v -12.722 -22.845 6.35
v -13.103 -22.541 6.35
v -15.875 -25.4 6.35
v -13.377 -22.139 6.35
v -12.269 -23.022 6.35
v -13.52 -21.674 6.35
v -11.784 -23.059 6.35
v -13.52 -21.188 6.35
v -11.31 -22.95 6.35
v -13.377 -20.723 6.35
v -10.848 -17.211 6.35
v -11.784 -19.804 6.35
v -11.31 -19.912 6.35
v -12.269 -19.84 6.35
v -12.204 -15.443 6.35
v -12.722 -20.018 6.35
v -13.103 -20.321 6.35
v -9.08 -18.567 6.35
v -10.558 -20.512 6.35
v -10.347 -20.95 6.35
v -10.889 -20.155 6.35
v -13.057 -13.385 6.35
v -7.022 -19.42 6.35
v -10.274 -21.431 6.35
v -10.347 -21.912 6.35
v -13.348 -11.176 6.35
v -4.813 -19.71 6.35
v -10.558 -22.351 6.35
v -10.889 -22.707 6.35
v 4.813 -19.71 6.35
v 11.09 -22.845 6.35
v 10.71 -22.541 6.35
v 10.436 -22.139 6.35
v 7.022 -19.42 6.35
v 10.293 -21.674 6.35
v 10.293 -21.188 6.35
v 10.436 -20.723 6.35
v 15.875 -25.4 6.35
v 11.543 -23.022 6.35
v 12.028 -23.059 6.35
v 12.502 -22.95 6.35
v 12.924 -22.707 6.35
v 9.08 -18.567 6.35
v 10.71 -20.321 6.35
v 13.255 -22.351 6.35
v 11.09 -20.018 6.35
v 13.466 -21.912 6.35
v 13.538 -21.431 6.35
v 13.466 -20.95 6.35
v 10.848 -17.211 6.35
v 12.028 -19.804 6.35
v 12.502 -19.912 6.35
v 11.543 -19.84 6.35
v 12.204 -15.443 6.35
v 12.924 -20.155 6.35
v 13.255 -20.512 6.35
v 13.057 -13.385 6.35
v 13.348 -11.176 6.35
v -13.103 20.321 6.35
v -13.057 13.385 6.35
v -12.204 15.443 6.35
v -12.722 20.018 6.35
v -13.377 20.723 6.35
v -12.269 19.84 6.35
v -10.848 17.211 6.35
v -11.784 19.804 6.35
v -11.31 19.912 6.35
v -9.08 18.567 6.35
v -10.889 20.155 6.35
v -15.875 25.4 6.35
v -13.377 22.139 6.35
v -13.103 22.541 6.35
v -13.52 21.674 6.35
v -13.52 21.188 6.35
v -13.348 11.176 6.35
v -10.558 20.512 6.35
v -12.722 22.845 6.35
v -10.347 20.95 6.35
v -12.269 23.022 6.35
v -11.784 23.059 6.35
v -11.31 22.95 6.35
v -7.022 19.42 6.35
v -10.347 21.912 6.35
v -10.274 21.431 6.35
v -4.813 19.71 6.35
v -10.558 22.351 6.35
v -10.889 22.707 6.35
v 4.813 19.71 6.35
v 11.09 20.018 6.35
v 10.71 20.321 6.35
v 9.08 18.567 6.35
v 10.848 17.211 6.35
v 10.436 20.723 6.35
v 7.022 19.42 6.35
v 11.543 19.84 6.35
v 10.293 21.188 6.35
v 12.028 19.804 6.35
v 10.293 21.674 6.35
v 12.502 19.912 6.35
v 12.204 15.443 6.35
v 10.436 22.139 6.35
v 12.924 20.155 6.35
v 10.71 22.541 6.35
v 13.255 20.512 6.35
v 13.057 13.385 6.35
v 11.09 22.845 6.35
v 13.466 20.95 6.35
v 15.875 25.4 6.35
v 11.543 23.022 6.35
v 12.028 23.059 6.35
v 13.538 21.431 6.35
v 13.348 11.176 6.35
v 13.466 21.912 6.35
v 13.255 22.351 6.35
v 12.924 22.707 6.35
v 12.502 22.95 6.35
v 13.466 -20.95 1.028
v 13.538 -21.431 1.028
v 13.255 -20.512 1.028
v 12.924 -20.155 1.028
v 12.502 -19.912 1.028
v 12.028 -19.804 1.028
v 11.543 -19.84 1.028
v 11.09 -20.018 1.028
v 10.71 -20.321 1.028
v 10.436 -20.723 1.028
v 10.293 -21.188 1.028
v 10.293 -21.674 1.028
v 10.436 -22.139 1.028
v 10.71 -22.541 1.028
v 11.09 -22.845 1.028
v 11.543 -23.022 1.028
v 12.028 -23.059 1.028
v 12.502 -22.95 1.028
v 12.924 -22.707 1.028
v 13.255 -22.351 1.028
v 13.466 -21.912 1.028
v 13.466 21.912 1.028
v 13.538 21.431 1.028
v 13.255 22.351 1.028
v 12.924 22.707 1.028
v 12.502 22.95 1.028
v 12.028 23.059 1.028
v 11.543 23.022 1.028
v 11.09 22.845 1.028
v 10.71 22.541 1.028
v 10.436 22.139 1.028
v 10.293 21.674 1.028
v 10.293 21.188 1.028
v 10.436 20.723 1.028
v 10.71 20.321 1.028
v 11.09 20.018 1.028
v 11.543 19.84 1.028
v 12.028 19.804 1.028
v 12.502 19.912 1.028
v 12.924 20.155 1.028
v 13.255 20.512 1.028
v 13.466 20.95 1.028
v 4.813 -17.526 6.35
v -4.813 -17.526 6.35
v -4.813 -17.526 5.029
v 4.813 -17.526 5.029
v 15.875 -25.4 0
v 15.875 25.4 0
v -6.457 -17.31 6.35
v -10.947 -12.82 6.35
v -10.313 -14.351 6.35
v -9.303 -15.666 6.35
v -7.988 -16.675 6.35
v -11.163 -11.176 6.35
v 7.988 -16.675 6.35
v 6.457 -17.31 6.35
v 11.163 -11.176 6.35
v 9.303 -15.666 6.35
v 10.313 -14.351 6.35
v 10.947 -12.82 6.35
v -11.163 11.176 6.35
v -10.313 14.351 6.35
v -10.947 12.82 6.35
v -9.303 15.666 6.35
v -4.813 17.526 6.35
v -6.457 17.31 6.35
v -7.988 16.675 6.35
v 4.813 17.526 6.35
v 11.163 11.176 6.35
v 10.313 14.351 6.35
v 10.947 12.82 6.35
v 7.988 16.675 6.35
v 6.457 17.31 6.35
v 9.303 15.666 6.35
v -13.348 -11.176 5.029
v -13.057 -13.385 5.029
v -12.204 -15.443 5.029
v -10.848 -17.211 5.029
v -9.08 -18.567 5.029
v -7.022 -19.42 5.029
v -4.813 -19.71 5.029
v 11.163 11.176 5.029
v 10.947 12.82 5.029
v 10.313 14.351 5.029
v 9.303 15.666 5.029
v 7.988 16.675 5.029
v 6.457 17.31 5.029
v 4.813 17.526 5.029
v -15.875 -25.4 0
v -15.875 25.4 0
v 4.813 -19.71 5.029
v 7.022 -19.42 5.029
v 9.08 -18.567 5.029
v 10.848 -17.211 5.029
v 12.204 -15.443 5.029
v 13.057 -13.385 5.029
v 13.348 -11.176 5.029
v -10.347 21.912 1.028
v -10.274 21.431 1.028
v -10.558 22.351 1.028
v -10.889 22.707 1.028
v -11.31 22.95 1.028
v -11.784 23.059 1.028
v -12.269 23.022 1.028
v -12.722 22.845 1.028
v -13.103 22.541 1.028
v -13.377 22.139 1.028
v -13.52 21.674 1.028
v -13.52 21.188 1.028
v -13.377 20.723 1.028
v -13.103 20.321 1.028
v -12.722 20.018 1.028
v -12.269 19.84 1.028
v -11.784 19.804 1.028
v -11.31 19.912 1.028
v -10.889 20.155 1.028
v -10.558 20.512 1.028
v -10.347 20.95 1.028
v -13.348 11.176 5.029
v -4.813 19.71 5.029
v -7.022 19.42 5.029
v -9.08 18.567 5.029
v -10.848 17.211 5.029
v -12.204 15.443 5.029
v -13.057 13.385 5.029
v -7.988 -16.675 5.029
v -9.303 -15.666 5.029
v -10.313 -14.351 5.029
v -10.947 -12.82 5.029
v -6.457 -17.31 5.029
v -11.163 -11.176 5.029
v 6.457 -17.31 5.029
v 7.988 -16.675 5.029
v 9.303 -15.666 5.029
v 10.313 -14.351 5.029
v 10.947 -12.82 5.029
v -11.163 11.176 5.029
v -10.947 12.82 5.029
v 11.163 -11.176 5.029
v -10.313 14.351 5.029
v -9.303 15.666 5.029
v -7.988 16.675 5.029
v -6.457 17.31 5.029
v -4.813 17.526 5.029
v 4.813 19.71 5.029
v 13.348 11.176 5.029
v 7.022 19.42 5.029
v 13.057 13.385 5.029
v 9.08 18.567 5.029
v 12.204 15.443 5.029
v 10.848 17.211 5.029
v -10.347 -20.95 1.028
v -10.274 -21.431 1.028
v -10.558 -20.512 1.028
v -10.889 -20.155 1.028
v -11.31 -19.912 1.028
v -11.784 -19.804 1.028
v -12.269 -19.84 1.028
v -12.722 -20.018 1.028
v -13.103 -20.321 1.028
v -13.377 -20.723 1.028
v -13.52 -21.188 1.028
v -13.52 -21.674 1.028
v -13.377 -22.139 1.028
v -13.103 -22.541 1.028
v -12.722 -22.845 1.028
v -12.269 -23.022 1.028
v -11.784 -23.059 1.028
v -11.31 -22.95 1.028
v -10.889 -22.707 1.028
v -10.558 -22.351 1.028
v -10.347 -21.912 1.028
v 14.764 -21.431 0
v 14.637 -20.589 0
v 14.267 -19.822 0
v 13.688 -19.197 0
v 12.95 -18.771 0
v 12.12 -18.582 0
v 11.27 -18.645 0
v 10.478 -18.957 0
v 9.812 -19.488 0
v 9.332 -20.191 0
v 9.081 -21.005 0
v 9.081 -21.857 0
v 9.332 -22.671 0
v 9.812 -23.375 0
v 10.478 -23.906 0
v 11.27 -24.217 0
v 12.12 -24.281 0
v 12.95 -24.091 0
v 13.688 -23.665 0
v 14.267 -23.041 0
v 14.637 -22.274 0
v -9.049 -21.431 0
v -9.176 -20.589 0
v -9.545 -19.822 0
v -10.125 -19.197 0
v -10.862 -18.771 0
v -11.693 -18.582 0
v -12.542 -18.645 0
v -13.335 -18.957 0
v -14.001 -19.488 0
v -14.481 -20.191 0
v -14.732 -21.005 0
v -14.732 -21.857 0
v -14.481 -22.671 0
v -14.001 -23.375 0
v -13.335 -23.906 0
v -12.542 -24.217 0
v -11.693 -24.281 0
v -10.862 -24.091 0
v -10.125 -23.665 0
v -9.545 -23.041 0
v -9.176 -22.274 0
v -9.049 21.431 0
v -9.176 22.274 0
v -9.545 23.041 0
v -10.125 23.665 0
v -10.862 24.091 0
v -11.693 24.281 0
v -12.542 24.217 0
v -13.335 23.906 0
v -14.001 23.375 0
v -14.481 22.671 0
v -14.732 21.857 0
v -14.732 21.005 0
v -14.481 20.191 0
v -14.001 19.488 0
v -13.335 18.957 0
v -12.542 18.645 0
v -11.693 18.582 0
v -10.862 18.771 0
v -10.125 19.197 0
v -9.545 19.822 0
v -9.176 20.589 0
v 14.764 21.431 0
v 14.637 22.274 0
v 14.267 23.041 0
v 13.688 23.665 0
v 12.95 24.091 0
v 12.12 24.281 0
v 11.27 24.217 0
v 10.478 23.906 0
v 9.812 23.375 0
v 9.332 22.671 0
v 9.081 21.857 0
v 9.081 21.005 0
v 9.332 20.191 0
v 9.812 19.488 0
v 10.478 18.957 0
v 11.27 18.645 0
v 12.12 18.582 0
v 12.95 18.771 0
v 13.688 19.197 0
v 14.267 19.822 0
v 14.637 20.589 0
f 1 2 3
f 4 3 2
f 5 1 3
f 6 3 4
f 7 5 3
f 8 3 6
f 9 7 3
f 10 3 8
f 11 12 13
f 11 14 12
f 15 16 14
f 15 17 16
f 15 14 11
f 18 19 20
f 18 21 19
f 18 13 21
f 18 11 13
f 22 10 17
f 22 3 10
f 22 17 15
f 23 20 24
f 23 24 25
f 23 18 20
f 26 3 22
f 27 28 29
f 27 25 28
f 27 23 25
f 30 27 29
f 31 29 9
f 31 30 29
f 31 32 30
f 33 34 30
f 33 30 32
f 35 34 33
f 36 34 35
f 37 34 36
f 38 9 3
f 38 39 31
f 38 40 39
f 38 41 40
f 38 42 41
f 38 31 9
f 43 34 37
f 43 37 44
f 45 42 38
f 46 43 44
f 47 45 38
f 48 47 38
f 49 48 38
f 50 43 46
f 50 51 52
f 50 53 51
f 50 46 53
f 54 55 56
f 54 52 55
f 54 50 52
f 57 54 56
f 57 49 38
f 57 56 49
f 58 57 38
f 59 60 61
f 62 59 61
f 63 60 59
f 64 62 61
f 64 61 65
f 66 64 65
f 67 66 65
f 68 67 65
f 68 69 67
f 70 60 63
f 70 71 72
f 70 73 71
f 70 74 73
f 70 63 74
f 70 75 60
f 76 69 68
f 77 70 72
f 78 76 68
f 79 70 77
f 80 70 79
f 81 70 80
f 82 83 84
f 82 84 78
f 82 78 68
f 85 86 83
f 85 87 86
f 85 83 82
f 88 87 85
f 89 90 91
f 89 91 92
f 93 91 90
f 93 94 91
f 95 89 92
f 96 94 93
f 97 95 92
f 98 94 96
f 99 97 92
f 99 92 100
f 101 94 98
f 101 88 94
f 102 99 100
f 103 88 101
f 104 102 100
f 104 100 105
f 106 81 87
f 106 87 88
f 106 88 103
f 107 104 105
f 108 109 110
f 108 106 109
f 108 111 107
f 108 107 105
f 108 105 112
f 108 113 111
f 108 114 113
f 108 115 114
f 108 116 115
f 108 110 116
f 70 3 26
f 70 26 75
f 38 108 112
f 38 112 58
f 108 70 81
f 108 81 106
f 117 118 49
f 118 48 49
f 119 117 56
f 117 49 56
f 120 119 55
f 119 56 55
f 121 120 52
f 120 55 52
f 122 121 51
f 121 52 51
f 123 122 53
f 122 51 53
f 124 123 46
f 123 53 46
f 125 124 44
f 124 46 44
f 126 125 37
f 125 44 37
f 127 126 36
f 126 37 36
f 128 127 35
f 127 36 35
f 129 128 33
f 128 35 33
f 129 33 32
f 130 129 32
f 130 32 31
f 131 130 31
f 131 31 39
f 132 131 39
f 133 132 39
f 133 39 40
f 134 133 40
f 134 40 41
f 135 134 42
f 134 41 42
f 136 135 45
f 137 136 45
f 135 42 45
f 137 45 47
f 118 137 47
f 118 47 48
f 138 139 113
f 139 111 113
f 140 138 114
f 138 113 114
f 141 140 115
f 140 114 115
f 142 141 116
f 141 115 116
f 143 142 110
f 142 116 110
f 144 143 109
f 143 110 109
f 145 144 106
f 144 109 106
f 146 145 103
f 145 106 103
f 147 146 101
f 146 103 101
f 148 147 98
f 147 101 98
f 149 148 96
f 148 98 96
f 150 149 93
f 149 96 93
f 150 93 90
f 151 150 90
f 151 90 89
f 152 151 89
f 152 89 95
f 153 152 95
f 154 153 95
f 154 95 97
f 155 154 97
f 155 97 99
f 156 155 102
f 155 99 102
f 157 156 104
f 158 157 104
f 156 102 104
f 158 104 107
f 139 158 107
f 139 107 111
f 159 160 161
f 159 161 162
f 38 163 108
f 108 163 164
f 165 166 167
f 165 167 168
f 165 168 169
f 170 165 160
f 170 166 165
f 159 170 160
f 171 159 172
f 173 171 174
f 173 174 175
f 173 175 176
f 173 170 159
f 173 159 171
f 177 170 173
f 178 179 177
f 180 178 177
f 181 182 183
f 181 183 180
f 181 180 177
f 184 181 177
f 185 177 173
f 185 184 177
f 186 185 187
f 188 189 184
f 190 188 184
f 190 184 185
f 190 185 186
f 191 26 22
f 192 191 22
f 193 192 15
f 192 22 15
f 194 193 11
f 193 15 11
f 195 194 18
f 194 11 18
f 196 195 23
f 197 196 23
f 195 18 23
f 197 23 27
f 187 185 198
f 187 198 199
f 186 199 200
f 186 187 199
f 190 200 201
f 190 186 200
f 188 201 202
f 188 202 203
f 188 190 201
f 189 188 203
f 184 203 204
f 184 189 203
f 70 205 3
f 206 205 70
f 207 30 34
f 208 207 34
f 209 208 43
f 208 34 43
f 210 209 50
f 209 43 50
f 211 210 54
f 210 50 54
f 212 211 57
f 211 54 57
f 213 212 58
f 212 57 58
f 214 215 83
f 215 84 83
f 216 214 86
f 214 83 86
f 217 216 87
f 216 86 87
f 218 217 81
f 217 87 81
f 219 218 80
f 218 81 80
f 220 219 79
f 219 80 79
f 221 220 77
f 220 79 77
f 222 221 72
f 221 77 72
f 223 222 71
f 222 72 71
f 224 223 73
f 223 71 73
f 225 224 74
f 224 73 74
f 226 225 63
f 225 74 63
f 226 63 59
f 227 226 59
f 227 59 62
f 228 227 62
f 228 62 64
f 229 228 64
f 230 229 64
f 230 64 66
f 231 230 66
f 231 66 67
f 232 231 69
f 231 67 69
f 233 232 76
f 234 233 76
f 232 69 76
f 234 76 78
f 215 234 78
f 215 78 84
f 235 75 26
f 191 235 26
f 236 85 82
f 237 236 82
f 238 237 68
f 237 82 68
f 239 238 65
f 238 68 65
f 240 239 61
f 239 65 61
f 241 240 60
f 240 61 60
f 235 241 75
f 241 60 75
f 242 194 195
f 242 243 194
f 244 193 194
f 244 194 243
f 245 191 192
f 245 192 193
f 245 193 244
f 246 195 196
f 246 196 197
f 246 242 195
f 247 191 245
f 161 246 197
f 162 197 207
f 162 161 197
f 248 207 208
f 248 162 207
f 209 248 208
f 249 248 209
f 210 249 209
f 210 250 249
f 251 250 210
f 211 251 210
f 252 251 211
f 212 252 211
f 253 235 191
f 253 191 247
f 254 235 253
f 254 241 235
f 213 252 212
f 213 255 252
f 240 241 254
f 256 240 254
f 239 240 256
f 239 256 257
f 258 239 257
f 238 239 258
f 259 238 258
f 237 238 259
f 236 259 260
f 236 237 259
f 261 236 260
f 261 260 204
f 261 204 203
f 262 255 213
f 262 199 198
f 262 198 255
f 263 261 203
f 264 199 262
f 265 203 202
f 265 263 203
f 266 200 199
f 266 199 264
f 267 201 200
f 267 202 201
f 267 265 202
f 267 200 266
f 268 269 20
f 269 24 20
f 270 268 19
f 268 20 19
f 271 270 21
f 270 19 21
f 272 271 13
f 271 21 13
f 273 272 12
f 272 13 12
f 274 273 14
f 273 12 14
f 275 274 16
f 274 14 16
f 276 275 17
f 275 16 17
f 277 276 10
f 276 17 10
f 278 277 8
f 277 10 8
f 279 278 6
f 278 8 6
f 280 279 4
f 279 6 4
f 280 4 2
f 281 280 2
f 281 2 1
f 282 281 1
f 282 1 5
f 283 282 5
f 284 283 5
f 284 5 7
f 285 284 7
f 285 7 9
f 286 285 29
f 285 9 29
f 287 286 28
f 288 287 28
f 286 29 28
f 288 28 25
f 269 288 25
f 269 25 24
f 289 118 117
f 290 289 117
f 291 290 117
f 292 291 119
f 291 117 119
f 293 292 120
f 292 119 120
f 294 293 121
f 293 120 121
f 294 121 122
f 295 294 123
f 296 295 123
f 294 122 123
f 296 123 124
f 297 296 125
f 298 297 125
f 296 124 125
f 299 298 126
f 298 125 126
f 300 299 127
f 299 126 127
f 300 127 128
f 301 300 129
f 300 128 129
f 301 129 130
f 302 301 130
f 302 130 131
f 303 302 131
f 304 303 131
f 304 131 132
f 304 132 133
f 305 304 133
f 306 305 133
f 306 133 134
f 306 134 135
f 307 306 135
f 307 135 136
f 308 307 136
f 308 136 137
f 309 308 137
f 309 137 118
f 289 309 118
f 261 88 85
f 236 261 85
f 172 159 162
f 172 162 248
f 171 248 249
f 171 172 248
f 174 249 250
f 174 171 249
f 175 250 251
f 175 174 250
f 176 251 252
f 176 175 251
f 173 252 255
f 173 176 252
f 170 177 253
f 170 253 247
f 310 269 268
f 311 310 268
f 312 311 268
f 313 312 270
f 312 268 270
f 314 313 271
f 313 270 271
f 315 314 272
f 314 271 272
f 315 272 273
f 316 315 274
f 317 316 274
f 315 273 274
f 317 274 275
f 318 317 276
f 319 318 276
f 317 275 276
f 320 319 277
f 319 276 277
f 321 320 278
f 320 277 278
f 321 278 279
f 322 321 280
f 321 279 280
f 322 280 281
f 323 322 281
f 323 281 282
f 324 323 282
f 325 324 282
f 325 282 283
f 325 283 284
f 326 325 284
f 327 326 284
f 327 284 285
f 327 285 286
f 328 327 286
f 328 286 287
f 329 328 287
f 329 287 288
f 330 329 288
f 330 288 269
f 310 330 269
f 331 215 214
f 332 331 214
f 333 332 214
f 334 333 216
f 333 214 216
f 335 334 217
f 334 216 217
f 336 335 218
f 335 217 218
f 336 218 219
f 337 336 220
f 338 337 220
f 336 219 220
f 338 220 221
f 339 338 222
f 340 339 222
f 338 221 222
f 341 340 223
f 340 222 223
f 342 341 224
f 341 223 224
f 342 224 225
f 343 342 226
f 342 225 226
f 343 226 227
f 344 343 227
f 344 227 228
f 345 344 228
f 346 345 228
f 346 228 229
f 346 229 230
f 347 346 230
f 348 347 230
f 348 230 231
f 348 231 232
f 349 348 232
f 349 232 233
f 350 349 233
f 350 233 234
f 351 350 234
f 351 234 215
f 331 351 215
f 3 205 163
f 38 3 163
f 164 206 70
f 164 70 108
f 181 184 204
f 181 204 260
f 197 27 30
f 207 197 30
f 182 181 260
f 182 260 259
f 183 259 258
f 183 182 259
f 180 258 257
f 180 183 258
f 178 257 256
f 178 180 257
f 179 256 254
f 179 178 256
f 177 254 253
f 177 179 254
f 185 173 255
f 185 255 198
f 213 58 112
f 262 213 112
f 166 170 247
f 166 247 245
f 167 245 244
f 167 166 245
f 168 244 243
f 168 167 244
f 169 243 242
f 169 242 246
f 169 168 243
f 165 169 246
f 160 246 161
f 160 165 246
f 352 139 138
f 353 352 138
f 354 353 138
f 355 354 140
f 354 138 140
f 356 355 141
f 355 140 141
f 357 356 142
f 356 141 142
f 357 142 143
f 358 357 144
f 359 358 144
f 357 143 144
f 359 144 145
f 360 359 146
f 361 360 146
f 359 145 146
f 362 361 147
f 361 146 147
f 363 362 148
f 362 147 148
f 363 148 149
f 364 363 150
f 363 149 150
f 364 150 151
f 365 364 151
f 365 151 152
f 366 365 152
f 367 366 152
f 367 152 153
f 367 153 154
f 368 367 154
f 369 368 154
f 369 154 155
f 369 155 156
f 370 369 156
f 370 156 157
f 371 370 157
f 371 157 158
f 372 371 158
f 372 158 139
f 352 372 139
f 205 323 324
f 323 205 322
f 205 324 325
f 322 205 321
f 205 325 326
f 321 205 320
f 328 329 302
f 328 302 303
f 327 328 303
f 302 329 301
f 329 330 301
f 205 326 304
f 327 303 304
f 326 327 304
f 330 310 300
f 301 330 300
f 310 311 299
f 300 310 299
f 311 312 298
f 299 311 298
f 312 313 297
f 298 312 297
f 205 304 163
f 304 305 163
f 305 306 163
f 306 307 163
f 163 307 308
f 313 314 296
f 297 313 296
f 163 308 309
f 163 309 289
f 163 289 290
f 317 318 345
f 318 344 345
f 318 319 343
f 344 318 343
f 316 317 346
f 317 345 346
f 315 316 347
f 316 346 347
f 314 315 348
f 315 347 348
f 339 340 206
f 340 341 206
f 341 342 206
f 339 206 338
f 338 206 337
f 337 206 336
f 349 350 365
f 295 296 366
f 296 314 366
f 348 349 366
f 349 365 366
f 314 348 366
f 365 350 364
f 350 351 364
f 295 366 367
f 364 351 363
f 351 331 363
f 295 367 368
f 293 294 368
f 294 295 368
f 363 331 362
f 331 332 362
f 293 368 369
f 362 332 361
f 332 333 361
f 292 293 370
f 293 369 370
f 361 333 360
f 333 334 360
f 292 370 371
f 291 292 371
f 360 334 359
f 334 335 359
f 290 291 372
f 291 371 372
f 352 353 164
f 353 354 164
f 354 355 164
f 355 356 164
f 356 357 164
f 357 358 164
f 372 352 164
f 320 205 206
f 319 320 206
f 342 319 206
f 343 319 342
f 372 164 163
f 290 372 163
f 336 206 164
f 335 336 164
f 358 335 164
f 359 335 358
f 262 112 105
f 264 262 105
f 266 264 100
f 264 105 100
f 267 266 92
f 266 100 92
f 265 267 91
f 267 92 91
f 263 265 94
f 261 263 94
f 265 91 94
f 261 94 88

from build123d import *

# Parameters (mm, degrees)
SKETCH1_W                                         = 31.75
SKETCH1_H                                         = 50.8
BOSS_EXTRUDE1_DEPTH                               = 6.35
CUT_EXTRUDE2_DASH_027_DEPTH                       = 1.3208
CSK_FOR_4_FLAT_HEAD_MACHINE_SCREW_100_D           = 3.2639
CSK_FOR_4_FLAT_HEAD_MACHINE_SCREW_100_CSINK_D     = 5.715
CSK_FOR_4_FLAT_HEAD_MACHINE_SCREW_100_CSINK_ANGLE = 100


with BuildPart() as part:
    # Sketch1 → Boss-Extrude1 (new body)
    with BuildSketch(Plane.XY):
        Rectangle(SKETCH1_W, SKETCH1_H)
    extrude(amount=BOSS_EXTRUDE1_DEPTH)

    # Sketch3 → Cut-Extrude2 - dash 027 (cut)
    with BuildSketch(Plane.XY.offset(6.35)):
        with BuildLine():
            Line((13.3477, -11.176), (13.3477, 11.176))
            ThreePointArc((13.3477, 11.176), (10.848032113, 17.210732113), (4.8133, 19.7104))
            Line((4.8133, 19.7104), (-4.8133, 19.7104))
            ThreePointArc((-4.8133, 19.7104), (-10.848032113, 17.210732113), (-13.3477, 11.176))
            Line((-13.3477, 11.176), (-13.3477, -11.176))
            ThreePointArc((-13.3477, -11.176), (-10.848032113, -17.210732113), (-4.8133, -19.7104))
            Line((-4.8133, -19.7104), (4.8133, -19.7104))
            ThreePointArc((4.8133, -19.7104), (10.848032113, -17.210732113), (13.3477, -11.176))
        make_face()
        with BuildLine():
            Line((-4.8133, -17.526), (4.8133, -17.526))
            ThreePointArc((4.8133, -17.526), (9.303428061, -15.666128061), (11.1633, -11.176))
            Line((11.1633, -11.176), (11.1633, 11.176))
            ThreePointArc((11.1633, 11.176), (9.303428061, 15.666128061), (4.8133, 17.526))
            Line((4.8133, 17.526), (-4.8133, 17.526))
            ThreePointArc((-4.8133, 17.526), (-9.303428061, 15.666128061), (-11.1633, 11.176))
            Line((-11.1633, 11.176), (-11.1633, -11.176))
            ThreePointArc((-11.1633, -11.176), (-9.303428061, -15.666128061), (-4.8133, -17.526))
        make_face(mode=Mode.SUBTRACT)
    extrude(amount=-CUT_EXTRUDE2_DASH_027_DEPTH, mode=Mode.SUBTRACT)

    # CSK for #4 Flat Head Machine Screw (100)1 (through all)
    with Locations(Plane(origin=(0, 0, 0), x_dir=(-1, 0, 0), z_dir=(0, 0, -1))):
        with Locations((-11.90625, 21.43125), (11.90625, 21.43125), (-11.90625, -21.43125), (11.90625, -21.43125)):
            CounterSinkHole(CSK_FOR_4_FLAT_HEAD_MACHINE_SCREW_100_D / 2, CSK_FOR_4_FLAT_HEAD_MACHINE_SCREW_100_CSINK_D / 2, counter_sink_angle=CSK_FOR_4_FLAT_HEAD_MACHINE_SCREW_100_CSINK_ANGLE)


solid = part.part
